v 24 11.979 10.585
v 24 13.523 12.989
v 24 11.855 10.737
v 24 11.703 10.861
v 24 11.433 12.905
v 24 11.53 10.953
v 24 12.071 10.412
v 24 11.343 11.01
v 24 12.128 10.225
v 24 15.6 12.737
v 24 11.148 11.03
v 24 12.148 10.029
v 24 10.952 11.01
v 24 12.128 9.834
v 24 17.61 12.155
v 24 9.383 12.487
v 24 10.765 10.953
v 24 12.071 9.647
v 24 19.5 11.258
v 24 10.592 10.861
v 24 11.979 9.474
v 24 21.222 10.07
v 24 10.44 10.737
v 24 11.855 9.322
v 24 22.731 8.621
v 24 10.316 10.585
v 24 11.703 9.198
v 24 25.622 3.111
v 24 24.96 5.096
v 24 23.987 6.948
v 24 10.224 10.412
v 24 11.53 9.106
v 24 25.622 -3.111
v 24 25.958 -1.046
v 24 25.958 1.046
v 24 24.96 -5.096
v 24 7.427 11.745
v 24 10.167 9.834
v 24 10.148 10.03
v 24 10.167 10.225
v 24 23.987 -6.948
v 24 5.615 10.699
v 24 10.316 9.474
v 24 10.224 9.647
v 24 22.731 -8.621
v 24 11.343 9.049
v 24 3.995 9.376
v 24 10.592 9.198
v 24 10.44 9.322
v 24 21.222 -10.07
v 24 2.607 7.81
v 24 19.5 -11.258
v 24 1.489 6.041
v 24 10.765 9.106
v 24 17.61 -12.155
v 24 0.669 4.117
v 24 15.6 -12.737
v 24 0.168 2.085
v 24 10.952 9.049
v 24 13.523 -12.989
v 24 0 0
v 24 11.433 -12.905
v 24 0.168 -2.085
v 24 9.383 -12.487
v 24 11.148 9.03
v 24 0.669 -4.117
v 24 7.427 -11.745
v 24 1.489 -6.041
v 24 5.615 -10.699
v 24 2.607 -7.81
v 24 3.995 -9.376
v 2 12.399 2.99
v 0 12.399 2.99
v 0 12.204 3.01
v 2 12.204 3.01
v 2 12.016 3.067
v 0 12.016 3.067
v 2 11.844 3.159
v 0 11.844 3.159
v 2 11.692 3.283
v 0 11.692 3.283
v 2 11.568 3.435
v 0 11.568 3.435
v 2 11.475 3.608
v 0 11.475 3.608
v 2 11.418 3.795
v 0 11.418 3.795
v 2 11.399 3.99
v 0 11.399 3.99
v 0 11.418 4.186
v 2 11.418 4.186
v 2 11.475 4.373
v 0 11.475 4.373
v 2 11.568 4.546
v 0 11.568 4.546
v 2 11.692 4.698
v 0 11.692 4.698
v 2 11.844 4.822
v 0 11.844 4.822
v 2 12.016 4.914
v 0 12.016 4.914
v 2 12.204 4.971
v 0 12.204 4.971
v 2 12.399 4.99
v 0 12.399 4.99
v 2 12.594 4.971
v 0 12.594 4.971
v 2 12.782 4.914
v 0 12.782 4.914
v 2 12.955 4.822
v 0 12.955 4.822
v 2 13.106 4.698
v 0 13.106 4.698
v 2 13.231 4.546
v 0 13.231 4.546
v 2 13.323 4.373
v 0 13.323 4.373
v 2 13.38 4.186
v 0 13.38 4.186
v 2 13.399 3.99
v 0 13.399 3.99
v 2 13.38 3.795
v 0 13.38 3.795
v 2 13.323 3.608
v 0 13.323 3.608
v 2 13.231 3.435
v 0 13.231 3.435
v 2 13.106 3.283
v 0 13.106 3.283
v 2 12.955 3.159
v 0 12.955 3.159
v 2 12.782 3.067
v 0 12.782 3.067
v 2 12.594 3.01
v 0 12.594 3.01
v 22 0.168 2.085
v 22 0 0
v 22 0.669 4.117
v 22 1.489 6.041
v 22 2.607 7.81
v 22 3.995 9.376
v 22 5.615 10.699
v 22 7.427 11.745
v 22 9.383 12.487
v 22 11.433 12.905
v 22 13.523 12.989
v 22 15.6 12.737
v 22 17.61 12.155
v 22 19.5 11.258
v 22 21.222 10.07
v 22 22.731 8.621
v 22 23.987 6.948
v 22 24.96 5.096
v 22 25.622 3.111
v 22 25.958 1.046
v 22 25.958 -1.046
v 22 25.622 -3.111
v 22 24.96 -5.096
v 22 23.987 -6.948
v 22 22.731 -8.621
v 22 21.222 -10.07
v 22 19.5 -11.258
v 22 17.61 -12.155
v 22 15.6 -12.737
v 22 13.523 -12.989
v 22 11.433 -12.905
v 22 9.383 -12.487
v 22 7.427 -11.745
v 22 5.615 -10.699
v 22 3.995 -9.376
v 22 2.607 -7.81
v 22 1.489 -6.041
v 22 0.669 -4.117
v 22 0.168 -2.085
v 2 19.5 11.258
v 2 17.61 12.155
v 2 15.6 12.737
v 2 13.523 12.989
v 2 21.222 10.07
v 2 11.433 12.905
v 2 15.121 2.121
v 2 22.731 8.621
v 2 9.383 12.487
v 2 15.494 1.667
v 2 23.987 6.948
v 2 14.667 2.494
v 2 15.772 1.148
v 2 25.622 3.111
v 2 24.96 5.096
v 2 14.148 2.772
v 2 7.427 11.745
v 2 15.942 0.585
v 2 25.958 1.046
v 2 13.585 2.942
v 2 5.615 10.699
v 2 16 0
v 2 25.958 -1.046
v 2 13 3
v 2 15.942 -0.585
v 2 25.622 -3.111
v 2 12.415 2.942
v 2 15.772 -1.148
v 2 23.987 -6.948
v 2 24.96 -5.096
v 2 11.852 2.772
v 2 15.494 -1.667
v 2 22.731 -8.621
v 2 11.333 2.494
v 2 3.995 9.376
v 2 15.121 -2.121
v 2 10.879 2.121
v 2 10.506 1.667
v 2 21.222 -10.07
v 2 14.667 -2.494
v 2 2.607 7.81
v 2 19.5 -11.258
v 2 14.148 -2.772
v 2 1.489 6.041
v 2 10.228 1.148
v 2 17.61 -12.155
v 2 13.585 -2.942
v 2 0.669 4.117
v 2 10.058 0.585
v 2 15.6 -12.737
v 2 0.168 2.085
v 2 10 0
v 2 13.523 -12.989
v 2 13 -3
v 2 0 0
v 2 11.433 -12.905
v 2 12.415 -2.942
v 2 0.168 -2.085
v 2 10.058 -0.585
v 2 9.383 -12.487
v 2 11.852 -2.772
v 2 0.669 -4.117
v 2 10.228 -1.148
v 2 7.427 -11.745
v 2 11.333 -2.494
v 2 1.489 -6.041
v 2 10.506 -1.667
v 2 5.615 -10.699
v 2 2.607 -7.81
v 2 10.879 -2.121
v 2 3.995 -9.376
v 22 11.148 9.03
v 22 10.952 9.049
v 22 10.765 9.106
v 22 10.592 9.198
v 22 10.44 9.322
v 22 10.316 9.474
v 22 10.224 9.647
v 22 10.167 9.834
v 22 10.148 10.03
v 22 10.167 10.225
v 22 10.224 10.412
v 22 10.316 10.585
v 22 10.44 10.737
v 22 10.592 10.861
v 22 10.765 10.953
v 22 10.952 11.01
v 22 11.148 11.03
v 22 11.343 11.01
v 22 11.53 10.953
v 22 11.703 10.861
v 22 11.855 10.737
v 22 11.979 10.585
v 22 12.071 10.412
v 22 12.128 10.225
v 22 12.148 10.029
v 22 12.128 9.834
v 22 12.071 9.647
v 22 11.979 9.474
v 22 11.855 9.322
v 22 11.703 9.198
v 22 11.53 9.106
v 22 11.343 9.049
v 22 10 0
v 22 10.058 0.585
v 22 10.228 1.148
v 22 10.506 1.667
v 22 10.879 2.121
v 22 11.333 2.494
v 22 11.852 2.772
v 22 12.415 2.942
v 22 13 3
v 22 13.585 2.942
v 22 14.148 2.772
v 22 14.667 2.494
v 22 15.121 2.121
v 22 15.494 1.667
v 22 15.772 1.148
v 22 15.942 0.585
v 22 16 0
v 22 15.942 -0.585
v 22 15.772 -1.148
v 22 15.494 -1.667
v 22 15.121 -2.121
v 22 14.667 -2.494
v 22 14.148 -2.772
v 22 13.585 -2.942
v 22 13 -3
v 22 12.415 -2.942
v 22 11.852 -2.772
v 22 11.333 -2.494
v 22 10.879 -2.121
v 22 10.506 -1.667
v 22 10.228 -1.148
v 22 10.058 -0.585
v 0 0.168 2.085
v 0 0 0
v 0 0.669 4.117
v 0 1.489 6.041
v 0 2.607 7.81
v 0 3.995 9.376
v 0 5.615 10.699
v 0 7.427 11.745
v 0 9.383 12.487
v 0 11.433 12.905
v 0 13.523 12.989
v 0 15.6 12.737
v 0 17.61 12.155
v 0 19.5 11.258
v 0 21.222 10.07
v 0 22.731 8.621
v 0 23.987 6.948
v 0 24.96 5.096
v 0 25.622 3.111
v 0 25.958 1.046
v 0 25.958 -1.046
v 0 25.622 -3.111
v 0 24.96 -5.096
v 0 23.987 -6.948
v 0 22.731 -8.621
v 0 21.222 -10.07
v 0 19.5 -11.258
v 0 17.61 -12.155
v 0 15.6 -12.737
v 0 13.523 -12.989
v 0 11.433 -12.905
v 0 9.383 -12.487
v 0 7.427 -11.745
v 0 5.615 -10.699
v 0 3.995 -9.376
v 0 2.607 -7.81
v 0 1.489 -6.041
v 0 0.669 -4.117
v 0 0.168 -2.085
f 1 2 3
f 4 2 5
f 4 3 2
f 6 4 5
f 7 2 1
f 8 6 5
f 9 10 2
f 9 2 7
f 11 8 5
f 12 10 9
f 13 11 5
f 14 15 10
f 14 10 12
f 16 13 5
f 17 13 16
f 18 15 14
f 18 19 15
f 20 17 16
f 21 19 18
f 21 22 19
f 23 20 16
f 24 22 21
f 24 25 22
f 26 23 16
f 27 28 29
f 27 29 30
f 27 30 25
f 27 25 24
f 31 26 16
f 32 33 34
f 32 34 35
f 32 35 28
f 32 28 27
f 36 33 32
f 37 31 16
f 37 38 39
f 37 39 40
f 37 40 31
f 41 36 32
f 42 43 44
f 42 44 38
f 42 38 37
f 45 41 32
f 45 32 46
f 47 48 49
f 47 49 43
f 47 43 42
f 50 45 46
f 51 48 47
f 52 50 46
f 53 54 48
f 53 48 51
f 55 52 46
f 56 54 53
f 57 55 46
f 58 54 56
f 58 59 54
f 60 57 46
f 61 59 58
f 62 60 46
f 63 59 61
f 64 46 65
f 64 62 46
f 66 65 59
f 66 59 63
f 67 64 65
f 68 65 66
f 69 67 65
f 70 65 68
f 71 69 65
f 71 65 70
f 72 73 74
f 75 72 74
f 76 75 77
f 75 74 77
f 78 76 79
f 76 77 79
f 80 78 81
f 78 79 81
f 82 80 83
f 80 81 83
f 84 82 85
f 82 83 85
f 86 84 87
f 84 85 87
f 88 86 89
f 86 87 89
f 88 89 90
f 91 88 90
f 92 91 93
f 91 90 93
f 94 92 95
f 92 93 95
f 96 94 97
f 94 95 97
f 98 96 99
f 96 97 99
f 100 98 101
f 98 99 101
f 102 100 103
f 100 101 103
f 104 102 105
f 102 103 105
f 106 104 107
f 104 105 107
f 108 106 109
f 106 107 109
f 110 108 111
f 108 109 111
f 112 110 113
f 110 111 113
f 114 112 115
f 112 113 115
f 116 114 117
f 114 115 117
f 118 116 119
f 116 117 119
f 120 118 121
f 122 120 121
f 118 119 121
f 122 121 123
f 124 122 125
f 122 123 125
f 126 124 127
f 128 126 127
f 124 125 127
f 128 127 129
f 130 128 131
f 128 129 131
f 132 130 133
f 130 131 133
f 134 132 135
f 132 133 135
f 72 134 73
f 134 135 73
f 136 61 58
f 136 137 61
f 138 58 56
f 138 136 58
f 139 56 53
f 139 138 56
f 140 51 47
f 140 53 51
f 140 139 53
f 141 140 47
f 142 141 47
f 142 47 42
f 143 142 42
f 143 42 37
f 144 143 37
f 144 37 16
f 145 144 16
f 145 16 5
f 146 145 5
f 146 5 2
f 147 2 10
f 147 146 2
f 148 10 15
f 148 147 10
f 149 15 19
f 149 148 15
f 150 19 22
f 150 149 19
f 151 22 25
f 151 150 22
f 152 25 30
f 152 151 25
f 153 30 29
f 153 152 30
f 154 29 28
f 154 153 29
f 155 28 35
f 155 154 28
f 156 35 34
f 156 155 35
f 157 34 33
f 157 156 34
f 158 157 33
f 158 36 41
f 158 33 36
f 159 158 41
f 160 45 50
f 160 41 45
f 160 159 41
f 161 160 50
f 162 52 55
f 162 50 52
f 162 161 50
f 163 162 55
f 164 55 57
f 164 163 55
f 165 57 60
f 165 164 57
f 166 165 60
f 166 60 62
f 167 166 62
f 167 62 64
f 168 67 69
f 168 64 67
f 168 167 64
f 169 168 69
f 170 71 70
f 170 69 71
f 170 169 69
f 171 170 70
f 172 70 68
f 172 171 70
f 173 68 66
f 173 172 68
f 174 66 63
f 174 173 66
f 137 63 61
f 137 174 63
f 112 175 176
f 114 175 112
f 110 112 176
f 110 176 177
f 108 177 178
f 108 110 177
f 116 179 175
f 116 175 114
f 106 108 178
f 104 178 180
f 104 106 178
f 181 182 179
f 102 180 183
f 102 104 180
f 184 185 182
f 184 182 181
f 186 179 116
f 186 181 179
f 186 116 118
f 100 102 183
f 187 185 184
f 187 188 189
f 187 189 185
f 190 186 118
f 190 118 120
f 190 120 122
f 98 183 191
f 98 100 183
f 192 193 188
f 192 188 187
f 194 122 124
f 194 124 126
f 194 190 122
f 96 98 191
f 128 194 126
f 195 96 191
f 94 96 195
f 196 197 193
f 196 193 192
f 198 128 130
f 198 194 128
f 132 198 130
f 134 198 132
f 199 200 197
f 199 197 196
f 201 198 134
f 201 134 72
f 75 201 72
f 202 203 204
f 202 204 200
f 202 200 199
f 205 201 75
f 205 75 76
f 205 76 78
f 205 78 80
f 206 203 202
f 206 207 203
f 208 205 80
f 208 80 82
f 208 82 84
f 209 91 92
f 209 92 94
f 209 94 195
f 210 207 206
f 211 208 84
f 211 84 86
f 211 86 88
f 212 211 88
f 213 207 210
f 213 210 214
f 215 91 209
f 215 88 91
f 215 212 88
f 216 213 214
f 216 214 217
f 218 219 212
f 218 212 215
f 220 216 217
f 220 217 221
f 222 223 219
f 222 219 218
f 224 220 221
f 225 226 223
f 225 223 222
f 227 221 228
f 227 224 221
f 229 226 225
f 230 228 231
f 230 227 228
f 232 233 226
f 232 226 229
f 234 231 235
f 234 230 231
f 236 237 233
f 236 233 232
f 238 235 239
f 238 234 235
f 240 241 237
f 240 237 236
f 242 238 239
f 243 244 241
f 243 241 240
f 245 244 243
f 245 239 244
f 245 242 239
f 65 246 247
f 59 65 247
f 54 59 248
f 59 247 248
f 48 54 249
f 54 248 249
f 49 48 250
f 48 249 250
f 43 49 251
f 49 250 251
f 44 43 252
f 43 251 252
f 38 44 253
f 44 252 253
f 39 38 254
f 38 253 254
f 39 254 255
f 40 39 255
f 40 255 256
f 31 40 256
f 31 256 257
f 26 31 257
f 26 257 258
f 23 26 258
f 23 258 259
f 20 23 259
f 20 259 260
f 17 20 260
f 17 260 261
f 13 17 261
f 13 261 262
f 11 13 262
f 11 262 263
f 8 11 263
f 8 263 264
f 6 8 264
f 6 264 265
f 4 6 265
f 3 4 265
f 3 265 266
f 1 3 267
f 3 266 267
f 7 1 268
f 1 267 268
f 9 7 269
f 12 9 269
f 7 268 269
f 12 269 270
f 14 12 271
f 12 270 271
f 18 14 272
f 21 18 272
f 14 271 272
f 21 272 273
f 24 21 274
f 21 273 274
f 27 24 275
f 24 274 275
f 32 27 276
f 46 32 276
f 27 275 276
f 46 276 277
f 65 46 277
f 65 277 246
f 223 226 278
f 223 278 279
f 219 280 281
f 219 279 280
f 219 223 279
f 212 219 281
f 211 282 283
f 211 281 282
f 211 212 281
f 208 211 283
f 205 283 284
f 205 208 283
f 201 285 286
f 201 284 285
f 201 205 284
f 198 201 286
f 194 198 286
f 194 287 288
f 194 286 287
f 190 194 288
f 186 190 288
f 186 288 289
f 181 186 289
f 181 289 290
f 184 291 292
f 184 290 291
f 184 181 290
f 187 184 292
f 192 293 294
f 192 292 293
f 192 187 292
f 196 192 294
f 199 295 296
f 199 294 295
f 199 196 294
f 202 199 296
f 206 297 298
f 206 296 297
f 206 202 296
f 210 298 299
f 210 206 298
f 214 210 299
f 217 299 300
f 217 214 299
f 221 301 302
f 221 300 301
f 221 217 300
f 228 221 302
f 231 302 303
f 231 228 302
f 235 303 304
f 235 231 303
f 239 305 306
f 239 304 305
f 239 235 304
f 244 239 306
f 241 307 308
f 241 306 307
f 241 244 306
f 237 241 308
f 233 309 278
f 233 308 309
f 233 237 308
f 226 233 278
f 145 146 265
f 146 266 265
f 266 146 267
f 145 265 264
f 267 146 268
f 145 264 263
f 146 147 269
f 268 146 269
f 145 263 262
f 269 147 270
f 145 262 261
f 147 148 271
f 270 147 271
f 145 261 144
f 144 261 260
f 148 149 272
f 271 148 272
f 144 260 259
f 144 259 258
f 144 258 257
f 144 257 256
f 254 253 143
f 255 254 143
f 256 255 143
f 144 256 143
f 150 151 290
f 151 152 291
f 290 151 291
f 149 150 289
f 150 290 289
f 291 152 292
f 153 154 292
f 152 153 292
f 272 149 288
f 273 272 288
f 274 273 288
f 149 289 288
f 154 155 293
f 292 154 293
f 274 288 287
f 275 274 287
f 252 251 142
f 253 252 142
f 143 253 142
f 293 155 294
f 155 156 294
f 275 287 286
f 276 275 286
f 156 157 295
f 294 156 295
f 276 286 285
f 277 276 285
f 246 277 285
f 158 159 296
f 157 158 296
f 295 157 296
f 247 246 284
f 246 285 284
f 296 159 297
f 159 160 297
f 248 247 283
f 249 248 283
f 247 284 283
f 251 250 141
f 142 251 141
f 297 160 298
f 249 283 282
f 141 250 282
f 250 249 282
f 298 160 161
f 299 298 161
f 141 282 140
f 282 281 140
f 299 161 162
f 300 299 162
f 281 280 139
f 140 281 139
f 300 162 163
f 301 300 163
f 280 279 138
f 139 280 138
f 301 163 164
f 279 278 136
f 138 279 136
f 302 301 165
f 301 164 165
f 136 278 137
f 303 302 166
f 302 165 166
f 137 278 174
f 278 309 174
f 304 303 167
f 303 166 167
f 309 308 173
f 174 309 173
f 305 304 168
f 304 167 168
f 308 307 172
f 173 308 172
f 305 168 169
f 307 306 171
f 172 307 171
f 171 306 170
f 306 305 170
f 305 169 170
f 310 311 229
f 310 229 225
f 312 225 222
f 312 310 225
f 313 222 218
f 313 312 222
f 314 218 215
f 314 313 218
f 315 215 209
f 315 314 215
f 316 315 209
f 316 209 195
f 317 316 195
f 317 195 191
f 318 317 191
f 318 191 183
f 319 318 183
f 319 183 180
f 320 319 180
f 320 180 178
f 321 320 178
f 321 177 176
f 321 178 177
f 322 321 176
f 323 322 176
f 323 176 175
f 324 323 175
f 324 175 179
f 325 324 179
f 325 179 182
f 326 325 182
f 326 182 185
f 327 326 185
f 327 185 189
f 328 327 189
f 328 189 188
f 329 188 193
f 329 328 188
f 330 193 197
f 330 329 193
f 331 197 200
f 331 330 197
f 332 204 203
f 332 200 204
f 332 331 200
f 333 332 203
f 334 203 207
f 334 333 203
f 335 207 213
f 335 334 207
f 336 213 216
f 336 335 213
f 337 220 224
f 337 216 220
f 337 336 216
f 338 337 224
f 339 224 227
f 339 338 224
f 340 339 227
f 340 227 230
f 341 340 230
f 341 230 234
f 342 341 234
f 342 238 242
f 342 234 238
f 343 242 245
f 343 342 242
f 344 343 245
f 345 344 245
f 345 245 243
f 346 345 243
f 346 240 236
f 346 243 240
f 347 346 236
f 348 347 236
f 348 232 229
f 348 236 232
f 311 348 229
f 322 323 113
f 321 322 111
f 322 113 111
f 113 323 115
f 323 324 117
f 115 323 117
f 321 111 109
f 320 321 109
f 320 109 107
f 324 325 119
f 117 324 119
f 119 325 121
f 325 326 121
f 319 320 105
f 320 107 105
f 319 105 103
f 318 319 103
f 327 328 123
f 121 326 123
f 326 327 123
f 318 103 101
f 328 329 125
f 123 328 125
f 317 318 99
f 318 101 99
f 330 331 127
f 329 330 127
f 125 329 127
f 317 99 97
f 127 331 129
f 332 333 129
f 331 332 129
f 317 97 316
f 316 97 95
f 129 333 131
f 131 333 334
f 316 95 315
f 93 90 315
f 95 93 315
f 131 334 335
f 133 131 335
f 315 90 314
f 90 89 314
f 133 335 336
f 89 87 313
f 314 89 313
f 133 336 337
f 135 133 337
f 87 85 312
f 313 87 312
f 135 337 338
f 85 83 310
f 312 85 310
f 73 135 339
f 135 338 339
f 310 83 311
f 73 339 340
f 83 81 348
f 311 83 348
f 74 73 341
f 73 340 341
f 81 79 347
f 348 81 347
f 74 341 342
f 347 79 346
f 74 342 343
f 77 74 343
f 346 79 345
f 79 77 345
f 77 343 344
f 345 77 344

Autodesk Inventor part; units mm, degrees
ref_plane "YZ Plane" through (0, 0, 0) normal (1, 0, 0) x (0, 1, 0)
ref_plane "XZ Plane" through (0, 0, 0) normal (0, 1, 0) x (-1, 0, 0)
ref_plane "XY Plane" through (0, 0, 0) normal (0, 0, 1) x (1, 0, 0)
sketch "Sketch1" plane through (0, 0, 0) normal (0, 0, 1) x (1, 0, 0)
  line L0 (0, 0) -> (0, 13)
  line L1 (0, 13) -> (24, 13)
  line L2 (24, 13) -> (24, 0)
  line L3 (24, 0) -> (22, 0)
  line L4 (22, 0) -> (22, 10)
  line L5 (22, 10) -> (2, 10)
  line L6 (2, 10) -> (2, 0)
  line L7 (2, 0) -> (0, 0)
  dimension "d0" = 13
  dimension "d1" = 24
  dimension "d2" = 2
  dimension "d3" = 10
  dimension "d4" = 20
revolve "Revolution1" add sketch "Sketch1" angle 360 about axis through (0, 13, 0) along (1, 0, 0)
sketch "Sketch2" plane through (2, 13, 0) normal (1, 0, 0) x (0, 0, -1)
  point P0 (0, -13)
  point P1 (-3.9905, -0.6009)
hole "Hole1" at (2, 12.3991, 3.9905) direction (-1, 0, 0) diameter 2 end through all
sketch "Sketch3" plane through (24, 13, 0) normal (1, 0, 0) x (0, 0, -1)
  point P0 (0, -13)
  point P1 (-10.0295, -1.8525)
hole "Hole2" at (24, 11.1475, 10.0295) direction (-1, 0, 0) diameter 2 depth 8 tip angle 118
sketch "Sketch4" plane through (2, 13, 0) normal (1, 0, 0) x (0, 0, -1)
  point P0 (0, -13)
sketch "Sketch5" plane through (2, 13, 0) normal (1, 0, 0) x (0, 0, -1)
  point P0 (0, -13)
sketch "Sketch6" plane through (0, 13, 0) normal (-1, 0, 0) x (0, 0, 1)
  point P0 (0, -13)
properties part number "SpoolNoCenterHole1"
